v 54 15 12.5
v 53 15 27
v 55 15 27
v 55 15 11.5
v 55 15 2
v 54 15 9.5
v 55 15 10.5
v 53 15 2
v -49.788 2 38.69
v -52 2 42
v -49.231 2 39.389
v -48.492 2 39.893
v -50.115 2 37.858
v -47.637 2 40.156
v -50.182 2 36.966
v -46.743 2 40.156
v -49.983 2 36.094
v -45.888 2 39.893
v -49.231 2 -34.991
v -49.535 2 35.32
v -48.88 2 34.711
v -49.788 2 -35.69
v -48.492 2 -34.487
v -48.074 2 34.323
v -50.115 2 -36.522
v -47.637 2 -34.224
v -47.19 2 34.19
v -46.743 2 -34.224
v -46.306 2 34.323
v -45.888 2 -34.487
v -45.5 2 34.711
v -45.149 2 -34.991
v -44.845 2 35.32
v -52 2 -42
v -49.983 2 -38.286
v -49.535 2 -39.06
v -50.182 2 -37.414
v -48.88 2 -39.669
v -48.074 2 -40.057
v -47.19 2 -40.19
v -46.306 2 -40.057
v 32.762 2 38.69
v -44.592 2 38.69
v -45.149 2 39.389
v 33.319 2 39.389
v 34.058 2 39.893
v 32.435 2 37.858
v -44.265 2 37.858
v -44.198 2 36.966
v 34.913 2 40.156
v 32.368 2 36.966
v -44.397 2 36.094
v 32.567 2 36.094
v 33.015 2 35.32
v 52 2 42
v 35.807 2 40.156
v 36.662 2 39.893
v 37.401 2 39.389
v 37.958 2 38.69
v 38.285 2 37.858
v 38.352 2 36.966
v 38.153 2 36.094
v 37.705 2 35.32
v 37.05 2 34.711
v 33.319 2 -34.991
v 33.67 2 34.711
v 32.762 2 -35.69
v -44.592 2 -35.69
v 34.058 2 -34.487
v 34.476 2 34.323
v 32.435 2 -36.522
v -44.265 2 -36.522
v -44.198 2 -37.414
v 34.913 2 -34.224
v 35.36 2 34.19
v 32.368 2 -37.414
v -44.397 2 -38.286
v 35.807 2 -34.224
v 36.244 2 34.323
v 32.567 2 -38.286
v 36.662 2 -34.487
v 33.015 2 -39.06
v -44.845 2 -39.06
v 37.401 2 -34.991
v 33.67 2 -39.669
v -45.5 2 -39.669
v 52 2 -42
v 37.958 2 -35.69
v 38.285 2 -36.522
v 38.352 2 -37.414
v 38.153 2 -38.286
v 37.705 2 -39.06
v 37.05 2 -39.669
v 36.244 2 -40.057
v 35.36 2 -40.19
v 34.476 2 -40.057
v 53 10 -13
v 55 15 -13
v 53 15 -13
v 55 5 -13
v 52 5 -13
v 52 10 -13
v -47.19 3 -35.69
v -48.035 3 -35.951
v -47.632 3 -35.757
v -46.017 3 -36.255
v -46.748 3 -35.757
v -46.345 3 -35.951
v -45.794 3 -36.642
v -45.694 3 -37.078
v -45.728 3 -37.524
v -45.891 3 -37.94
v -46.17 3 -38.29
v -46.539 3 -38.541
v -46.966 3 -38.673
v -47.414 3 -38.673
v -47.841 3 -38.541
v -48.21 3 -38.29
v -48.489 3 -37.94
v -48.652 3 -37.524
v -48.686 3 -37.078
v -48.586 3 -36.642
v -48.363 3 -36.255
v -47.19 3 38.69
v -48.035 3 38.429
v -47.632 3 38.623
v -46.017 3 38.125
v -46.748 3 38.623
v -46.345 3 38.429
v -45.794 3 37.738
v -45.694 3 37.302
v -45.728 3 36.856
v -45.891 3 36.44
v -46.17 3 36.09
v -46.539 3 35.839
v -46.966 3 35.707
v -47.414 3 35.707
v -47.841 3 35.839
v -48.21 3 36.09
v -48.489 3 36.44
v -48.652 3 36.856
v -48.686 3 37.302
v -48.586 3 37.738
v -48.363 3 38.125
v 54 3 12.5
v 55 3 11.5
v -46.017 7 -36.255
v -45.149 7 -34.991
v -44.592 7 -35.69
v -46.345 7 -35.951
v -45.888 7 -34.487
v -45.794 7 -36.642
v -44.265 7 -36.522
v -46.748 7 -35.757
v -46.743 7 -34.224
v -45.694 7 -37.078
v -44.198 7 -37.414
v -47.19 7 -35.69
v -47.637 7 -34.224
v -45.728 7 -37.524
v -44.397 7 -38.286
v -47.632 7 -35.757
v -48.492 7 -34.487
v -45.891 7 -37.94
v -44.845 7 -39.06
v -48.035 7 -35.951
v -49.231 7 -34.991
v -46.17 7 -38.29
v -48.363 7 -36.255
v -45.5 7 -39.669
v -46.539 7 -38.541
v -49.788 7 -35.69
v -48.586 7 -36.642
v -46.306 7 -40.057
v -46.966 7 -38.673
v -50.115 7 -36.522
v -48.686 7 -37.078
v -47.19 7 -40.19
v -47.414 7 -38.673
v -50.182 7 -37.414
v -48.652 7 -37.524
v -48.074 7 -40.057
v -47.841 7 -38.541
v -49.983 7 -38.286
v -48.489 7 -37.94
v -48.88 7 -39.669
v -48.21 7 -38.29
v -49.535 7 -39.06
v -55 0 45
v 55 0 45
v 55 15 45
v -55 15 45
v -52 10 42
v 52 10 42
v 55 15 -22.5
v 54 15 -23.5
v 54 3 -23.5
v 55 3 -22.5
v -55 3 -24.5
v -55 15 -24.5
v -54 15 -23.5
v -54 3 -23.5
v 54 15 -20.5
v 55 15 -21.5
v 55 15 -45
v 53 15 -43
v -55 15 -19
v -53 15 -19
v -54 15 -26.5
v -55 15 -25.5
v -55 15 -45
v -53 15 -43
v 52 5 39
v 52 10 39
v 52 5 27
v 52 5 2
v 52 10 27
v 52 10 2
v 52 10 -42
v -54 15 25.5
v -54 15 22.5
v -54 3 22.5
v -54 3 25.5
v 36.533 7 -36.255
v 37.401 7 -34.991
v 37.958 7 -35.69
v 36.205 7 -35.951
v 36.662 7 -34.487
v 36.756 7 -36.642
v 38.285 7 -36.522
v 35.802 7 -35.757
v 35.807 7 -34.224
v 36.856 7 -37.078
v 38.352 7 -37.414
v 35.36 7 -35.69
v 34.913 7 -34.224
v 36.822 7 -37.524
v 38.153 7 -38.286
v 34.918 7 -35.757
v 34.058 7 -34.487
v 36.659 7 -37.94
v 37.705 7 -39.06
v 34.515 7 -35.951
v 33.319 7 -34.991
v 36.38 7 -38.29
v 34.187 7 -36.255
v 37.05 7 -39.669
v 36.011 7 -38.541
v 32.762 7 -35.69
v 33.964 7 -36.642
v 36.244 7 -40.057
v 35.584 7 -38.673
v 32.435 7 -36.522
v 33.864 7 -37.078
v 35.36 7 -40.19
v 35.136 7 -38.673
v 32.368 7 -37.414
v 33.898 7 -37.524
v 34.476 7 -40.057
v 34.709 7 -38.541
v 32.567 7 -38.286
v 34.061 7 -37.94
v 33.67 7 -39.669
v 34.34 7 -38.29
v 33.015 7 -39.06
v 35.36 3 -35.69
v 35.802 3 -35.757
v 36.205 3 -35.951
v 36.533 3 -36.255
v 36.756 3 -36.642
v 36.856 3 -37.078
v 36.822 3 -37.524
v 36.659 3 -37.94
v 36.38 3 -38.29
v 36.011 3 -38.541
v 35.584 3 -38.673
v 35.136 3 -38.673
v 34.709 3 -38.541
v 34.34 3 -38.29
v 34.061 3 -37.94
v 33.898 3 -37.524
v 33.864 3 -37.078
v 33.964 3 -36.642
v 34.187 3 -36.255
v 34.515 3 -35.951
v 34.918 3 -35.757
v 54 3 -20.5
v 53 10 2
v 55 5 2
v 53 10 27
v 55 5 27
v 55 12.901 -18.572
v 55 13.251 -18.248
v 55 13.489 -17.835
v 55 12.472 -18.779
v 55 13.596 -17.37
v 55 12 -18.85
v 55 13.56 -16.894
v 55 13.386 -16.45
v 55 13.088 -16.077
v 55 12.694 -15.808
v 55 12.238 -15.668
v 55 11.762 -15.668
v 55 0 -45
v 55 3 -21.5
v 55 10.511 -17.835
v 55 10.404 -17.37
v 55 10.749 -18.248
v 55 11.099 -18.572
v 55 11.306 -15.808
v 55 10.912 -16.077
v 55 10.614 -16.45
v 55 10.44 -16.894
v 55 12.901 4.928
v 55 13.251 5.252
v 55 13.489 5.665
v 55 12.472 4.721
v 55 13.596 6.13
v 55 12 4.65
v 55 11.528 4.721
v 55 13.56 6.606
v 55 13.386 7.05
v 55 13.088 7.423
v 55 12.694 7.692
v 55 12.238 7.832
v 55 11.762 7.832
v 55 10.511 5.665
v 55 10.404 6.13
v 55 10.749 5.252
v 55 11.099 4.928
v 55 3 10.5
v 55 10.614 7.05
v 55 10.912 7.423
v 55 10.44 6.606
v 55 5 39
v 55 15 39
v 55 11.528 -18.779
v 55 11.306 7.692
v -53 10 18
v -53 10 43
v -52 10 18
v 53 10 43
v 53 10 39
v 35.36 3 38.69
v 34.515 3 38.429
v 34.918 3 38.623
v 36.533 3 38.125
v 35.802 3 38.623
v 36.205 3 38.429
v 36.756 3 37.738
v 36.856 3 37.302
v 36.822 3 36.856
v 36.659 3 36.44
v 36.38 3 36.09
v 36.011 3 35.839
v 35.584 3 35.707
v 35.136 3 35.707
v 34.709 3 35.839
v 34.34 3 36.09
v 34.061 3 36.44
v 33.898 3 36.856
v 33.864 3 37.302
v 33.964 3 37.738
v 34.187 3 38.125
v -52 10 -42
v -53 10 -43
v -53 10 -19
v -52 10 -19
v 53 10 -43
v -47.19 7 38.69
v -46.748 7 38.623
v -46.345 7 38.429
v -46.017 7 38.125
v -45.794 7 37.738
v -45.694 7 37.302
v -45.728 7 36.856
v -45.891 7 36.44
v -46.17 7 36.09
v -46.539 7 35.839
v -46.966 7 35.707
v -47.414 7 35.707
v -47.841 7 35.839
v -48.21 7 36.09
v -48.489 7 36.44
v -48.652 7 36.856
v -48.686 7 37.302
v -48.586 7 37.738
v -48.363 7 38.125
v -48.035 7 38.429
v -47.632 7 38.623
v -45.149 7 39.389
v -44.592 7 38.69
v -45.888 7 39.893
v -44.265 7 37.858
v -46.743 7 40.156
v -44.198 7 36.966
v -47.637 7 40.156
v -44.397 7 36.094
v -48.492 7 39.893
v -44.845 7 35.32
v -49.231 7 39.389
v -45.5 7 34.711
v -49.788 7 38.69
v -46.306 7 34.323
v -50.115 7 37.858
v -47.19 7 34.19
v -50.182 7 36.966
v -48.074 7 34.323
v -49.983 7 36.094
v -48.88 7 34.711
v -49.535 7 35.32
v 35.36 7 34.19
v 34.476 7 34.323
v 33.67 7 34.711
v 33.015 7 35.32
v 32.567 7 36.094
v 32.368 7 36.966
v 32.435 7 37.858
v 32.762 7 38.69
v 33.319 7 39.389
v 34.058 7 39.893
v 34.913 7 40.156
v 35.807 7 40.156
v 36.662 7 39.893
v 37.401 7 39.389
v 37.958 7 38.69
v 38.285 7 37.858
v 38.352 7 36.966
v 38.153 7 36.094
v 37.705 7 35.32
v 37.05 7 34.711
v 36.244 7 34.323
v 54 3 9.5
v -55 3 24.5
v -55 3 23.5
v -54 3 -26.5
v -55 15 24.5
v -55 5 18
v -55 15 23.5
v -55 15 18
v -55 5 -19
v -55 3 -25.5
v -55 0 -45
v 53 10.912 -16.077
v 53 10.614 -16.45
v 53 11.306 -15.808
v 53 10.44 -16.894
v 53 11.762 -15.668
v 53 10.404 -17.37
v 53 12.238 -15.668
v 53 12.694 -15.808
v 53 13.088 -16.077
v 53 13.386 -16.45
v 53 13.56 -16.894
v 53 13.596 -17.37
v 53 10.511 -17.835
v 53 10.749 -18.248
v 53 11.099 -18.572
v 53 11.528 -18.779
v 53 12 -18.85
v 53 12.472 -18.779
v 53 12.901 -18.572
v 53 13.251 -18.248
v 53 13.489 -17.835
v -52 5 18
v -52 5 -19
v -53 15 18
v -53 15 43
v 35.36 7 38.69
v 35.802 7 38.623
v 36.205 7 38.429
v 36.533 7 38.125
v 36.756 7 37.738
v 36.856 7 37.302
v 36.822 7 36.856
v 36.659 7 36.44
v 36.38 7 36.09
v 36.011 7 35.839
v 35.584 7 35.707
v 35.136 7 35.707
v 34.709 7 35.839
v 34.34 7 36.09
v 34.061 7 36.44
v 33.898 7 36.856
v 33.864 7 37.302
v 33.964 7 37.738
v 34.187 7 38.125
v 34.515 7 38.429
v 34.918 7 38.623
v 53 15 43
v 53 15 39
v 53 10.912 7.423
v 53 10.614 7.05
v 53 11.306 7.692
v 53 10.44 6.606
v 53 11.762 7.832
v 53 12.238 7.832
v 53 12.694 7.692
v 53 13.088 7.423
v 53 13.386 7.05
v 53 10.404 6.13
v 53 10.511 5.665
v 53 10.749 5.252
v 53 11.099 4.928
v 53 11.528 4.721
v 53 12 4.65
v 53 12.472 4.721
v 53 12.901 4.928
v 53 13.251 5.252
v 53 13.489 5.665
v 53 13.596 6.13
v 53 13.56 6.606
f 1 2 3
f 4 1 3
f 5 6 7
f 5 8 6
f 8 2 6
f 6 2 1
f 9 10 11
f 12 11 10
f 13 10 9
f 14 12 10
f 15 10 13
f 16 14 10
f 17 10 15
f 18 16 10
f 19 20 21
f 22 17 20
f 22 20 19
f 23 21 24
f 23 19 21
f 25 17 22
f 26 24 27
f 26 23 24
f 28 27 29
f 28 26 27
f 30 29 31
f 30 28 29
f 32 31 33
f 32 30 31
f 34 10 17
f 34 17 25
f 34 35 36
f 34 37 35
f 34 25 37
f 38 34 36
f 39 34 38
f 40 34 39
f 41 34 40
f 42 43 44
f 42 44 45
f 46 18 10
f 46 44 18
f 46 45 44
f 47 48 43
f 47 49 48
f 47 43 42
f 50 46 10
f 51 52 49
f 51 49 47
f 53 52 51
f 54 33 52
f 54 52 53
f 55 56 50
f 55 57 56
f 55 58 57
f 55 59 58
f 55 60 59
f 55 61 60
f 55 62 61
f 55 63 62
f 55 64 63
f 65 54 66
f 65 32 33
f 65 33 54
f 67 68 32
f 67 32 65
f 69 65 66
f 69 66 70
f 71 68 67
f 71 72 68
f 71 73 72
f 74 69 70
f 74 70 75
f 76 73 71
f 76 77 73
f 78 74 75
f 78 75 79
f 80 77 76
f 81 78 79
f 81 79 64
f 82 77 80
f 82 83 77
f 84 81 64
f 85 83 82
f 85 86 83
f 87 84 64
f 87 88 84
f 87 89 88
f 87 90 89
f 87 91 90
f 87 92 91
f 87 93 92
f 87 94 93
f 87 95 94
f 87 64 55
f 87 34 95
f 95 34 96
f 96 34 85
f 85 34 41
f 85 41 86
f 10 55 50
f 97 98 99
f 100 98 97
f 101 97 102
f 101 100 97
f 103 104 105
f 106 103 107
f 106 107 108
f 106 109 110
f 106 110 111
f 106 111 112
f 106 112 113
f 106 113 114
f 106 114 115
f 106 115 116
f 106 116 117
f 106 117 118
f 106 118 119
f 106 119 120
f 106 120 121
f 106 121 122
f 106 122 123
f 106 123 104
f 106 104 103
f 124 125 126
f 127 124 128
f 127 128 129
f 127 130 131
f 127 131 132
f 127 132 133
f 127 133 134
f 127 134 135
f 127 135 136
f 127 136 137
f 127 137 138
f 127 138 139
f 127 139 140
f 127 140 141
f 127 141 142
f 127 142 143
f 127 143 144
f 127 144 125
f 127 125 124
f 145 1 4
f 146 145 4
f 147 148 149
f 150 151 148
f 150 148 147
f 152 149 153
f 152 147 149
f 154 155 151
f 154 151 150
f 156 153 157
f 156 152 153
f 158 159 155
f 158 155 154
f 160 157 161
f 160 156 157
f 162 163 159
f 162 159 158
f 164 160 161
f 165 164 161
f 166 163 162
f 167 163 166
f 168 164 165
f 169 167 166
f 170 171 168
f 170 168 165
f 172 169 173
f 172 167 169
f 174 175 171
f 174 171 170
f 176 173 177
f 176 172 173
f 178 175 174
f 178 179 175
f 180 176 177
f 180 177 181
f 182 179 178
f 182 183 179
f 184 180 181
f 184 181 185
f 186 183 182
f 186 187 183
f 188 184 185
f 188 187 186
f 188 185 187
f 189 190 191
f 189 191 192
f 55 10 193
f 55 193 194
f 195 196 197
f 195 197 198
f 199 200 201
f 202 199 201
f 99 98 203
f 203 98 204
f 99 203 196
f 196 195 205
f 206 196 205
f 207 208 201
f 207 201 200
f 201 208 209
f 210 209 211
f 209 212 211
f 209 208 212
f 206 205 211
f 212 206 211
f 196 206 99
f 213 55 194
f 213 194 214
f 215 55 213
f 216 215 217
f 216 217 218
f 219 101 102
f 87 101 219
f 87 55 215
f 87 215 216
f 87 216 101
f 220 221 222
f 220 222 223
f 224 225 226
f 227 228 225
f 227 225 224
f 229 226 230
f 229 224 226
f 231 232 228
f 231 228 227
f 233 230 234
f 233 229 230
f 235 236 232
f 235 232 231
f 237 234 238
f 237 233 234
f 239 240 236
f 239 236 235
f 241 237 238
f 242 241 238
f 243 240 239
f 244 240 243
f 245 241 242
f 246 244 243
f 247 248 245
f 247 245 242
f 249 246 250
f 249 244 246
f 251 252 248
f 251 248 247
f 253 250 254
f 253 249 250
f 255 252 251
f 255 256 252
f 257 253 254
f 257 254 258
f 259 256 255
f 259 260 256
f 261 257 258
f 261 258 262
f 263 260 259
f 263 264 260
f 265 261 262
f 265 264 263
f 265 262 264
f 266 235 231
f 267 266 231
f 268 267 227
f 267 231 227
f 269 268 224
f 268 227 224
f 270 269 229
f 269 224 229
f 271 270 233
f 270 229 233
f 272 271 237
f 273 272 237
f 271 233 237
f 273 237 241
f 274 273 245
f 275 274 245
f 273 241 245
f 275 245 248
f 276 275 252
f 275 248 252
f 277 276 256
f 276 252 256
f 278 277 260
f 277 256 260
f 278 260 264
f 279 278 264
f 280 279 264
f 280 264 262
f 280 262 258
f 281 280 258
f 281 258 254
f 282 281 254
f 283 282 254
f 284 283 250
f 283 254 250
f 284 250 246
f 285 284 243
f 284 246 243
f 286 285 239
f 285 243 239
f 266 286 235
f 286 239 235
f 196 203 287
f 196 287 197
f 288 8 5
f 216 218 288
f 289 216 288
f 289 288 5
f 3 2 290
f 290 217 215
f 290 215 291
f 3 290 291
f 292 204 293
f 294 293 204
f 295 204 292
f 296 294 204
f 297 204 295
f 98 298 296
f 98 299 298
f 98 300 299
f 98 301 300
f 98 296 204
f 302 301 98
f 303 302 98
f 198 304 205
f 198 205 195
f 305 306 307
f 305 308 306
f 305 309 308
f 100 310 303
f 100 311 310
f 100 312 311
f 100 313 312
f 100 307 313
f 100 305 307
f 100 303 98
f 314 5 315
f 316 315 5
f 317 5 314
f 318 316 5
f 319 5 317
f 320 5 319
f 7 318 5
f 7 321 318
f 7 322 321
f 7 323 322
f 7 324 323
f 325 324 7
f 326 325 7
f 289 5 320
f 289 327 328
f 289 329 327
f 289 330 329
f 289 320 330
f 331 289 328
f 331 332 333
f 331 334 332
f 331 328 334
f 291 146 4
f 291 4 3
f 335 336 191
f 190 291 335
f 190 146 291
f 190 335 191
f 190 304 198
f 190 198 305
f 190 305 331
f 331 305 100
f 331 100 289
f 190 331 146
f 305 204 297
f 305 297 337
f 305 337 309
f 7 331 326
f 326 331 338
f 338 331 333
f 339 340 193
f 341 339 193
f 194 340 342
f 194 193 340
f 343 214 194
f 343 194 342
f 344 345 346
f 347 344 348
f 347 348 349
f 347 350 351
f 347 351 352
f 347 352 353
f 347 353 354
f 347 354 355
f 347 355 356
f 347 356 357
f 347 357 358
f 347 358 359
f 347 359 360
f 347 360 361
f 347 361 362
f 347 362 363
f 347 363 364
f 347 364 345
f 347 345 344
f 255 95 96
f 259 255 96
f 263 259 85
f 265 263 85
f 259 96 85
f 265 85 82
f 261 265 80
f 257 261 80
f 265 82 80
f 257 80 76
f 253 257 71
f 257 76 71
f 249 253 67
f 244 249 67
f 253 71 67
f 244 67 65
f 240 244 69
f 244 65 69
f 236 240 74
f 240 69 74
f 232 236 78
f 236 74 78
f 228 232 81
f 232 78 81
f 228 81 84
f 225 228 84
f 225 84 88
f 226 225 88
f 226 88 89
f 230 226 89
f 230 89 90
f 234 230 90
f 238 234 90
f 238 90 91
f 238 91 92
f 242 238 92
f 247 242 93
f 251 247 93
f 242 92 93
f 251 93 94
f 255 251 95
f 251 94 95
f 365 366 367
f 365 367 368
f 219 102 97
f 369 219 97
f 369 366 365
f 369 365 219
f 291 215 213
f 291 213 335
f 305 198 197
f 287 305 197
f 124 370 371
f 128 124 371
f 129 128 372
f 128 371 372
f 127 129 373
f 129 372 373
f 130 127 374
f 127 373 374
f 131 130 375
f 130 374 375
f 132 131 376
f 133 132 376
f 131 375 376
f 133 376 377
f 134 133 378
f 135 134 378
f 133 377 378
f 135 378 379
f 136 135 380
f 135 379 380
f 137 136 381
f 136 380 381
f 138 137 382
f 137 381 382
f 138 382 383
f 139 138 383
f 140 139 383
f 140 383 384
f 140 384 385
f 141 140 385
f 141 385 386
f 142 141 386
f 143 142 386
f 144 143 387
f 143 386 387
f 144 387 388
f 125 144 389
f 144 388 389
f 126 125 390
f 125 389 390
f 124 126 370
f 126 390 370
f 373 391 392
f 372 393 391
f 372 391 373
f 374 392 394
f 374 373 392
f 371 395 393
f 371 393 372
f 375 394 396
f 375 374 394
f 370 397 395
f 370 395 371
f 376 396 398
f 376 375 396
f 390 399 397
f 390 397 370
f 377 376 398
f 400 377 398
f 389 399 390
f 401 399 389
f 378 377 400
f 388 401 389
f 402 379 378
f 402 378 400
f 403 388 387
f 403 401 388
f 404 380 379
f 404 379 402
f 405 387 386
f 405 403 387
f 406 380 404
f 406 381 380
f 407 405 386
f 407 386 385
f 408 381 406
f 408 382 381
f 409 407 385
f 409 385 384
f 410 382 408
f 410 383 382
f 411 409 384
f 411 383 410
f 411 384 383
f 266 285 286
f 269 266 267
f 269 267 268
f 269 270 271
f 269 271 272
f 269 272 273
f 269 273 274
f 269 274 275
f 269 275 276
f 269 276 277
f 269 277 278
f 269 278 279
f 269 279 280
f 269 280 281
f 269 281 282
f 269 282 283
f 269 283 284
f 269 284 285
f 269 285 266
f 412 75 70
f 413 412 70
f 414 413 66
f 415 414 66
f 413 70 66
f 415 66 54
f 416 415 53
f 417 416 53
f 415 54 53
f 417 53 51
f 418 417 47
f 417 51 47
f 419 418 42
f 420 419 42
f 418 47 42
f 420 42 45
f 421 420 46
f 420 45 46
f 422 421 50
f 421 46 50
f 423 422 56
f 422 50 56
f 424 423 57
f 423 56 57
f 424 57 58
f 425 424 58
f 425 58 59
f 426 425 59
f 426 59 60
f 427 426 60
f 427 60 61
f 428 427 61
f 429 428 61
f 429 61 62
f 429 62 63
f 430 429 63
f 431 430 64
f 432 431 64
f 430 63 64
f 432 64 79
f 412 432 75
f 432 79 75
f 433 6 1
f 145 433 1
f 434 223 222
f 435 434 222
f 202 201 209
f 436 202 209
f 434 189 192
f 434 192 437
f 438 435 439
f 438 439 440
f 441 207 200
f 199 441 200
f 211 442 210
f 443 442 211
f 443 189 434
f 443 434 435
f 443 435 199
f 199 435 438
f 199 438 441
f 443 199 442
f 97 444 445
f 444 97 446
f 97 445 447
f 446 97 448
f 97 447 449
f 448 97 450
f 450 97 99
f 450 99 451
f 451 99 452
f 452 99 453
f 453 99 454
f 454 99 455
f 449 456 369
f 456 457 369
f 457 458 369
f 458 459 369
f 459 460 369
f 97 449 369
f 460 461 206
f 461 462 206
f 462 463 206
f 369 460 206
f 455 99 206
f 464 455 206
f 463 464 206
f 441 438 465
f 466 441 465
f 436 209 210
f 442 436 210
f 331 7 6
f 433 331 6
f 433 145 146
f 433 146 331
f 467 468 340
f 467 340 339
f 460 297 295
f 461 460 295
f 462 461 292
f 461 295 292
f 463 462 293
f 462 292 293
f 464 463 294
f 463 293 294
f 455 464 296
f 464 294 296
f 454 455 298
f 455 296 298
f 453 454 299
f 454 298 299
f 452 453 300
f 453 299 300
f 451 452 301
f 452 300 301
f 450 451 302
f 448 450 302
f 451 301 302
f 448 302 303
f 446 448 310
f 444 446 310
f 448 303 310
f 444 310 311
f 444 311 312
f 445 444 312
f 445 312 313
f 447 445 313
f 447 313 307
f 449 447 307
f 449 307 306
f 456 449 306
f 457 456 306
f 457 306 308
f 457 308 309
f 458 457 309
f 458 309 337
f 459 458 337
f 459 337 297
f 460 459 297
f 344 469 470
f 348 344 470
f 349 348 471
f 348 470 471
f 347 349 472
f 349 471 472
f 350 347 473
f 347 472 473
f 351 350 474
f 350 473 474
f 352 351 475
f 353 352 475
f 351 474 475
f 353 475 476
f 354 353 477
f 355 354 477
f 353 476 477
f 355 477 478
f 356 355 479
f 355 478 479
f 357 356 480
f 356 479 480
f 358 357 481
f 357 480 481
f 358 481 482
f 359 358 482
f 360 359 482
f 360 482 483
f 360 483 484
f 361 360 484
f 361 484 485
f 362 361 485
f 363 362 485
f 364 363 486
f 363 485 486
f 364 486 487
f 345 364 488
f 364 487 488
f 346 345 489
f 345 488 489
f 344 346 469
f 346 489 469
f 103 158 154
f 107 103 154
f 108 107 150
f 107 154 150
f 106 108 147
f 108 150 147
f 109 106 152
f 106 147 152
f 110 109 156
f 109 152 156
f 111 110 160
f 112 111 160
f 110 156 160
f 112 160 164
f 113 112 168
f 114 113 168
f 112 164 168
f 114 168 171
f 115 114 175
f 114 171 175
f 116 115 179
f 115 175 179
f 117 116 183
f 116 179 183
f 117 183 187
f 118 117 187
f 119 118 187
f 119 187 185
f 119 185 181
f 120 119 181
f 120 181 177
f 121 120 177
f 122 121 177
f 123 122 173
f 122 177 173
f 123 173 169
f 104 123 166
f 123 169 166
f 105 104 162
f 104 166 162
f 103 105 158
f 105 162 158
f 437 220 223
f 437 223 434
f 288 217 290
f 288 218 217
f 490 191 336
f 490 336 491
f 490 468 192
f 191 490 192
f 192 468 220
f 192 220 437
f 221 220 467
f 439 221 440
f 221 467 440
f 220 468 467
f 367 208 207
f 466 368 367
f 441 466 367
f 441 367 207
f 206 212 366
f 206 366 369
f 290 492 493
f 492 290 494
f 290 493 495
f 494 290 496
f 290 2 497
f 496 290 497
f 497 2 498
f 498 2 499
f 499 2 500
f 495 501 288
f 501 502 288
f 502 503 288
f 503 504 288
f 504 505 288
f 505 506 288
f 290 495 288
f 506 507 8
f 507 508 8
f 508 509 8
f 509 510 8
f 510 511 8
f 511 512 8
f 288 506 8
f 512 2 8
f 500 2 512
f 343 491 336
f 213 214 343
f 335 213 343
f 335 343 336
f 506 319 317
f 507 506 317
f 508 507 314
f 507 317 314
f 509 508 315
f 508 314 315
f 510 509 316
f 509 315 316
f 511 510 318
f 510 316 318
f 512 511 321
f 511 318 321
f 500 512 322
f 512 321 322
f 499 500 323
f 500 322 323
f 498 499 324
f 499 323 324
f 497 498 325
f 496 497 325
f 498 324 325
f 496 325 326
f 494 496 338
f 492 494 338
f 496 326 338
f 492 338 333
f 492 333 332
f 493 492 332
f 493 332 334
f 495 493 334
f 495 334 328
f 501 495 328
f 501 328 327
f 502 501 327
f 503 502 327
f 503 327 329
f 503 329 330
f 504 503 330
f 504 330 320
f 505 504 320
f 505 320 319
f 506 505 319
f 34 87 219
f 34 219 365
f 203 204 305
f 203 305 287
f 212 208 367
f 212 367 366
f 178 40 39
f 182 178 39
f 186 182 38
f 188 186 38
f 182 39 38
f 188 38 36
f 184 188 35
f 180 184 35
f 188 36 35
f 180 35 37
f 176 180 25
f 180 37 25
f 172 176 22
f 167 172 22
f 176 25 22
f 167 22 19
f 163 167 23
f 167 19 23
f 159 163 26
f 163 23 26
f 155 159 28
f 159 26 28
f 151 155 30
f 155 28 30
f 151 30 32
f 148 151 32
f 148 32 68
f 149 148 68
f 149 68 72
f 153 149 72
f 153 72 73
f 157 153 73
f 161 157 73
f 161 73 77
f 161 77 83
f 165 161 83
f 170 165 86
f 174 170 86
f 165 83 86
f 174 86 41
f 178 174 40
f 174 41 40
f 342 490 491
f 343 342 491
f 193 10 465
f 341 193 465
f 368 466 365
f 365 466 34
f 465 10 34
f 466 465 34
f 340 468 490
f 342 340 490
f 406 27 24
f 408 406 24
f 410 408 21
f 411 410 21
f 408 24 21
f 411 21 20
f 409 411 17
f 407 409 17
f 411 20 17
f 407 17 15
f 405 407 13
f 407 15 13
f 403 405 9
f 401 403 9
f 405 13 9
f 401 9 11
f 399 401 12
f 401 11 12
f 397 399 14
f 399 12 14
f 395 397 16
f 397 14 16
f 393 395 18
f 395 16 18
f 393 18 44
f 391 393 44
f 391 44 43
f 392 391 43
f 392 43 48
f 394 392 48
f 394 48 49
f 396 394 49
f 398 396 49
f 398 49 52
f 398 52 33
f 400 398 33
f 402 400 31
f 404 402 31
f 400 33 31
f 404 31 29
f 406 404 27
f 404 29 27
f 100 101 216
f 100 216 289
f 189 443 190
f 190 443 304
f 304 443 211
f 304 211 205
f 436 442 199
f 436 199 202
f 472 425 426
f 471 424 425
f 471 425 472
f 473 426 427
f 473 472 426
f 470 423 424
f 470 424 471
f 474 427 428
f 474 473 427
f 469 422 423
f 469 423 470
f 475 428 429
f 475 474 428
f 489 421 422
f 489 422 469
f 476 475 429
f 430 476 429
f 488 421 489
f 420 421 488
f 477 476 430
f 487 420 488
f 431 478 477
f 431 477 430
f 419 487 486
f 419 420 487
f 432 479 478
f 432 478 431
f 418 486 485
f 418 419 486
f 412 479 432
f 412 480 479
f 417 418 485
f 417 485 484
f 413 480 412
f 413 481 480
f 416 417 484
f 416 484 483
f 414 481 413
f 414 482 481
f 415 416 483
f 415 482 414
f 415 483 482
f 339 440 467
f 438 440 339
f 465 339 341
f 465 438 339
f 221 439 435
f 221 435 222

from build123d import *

# Parameters (mm, degrees)
CROQUIS1_W              = 110
CROQUIS1_H              = 90
SALIENTE_EXTRUIR1_DEPTH = 2
CROQUIS3_R              = 3
SALIENTE_EXTRUIR2_DEPTH = 5
CROQUIS4_R              = 1.5
CORTAR_EXTRUIR1_DEPTH   = 4
CROQUIS5_W              = 3
CROQUIS5_H              = 25
SALIENTE_EXTRUIR3_DEPTH = 13
CROQUIS6_W              = 3
CROQUIS6_H              = 37
CROQUIS6_H_2            = 15
CROQUIS6_H_3            = 12
SALIENTE_EXTRUIR4_DEPTH = 3
CROQUIS7_W              = 106
CROQUIS7_H              = 86
CROQUIS7_W_2            = 104
CROQUIS7_H_2            = 84
CORTAR_EXTRUIR2_DEPTH   = 5
CORTAR_EXTRUIR3_DEPTH   = 12
CROQUIS9_R              = 1.6
CORTAR_EXTRUIR4_DEPTH   = 12
CORTAR_EXTRUIR5_DEPTH   = 12


with BuildPart() as part:
    # Croquis1 → Saliente-Extruir1 (new body)
    with BuildSketch(Plane(origin=(0, 0, 0), x_dir=(1, 0, 0), z_dir=(0, 1, 0))):
        Rectangle(CROQUIS1_W, CROQUIS1_H)
    extrude(amount=SALIENTE_EXTRUIR1_DEPTH)

    # Croquis3 → Saliente-Extruir2 (add)
    with BuildSketch(Plane(origin=(0, 2, 0), x_dir=(1, 0, 0), z_dir=(0, 1, 0))):
        with Locations(Location((-47.19, -37.19, 0), (0, 0, 90))):
            Circle(CROQUIS3_R)
        with Locations(Location((-47.19, 37.19, 0), (0, 0, 90))):
            Circle(CROQUIS3_R)
        with Locations(Location((35.36, -37.19, 0), (0, 0, 90))):
            Circle(CROQUIS3_R)
        with Locations(Location((35.36, 37.19, 0), (0, 0, 90))):
            Circle(CROQUIS3_R)
    extrude(amount=SALIENTE_EXTRUIR2_DEPTH)

    # Croquis4 → Cortar-Extruir1 (cut)
    with BuildSketch(Plane(origin=(0, 7, 0), x_dir=(1, 0, 0), z_dir=(0, 1, 0))):
        with Locations(Location((-47.19, -37.19, 0), (0, 0, 270))):
            Circle(CROQUIS4_R)
        with Locations(Location((35.36, -37.19, 0), (0, 0, 270))):
            Circle(CROQUIS4_R)
        with Locations(Location((35.36, 37.19, 0), (0, 0, 270))):
            Circle(CROQUIS4_R)
        with Locations(Location((-47.19, 37.19, 0), (0, 0, 270))):
            Circle(CROQUIS4_R)
    extrude(amount=-CORTAR_EXTRUIR1_DEPTH, mode=Mode.SUBTRACT)

    # Croquis5 → Saliente-Extruir3 (add)
    with BuildSketch(Plane(origin=(0, 2, 0), x_dir=(1, 0, 0), z_dir=(0, 1, 0))):
        Polygon((52, -39), (55, -39), (55, -45), (-55, -45), (-55, -18), (-52, -18), (-52, -42), (52, -42), align=None)
        Polygon((-55, 45), (55, 45), (55, 13), (52, 13), (52, 42), (-52, 42), (-52, 19), (-55, 19), align=None)
        with Locations((53.5, -14.5)):
            Rectangle(CROQUIS5_W, CROQUIS5_H)
    extrude(amount=SALIENTE_EXTRUIR3_DEPTH)

    # Croquis6 → Saliente-Extruir4 (add)
    with BuildSketch(Plane(origin=(0, 2, 0), x_dir=(1, 0, 0), z_dir=(0, 1, 0))):
        with Locations((-53.5, 0.5)):
            Rectangle(CROQUIS6_W, CROQUIS6_H)
        with Locations((53.5, 5.5)):
            Rectangle(CROQUIS6_W, CROQUIS6_H_2)
        with Locations((53.5, -33)):
            Rectangle(CROQUIS6_W, CROQUIS6_H_3)
    extrude(amount=SALIENTE_EXTRUIR4_DEPTH)

    # Croquis7 → Cortar-Extruir2 (cut)
    with BuildSketch(Plane(origin=(0, 15, 0), x_dir=(1, 0, 0), z_dir=(0, 1, 0))):
        Rectangle(CROQUIS7_W, CROQUIS7_H)
        Rectangle(CROQUIS7_W_2, CROQUIS7_H_2, mode=Mode.SUBTRACT)
    extrude(amount=-CORTAR_EXTRUIR2_DEPTH, mode=Mode.SUBTRACT)

    # Croquis8 → Cortar-Extruir3 (cut)
    with BuildSketch(Plane(origin=(0, 15, 0), x_dir=(1, 0, 0), z_dir=(0, 1, 0))):
        Polygon((55, -10.5), (54, -9.5), (54, -12.5), (55, -11.5), align=None)
        Polygon((55, 22.5), (55, 21.5), (54, 20.5), (54, 23.5), align=None)
    extrude(amount=-CORTAR_EXTRUIR3_DEPTH, mode=Mode.SUBTRACT)

    # Croquis9 → Cortar-Extruir4 (cut)
    with BuildSketch(Plane(origin=(55, 0, 0), x_dir=(0, 0, -1), z_dir=(1, 0, 0))):
        with Locations((-6.25, 12)):
            Circle(CROQUIS9_R)
        with Locations((17.25, 12)):
            Circle(CROQUIS9_R)
    extrude(amount=-CORTAR_EXTRUIR4_DEPTH, mode=Mode.SUBTRACT)

    # Croquis11 → Cortar-Extruir5 (cut)
    with BuildSketch(Plane(origin=(0, 15, 0), x_dir=(1, 0, 0), z_dir=(0, 1, 0))):
        Polygon((-55, -23.5), (-54, -22.5), (-54, -25.5), (-55, -24.5), align=None)
        Polygon((-55, 25.5), (-55, 24.5), (-54, 23.5), (-54, 26.5), align=None)
    extrude(amount=-CORTAR_EXTRUIR5_DEPTH, mode=Mode.SUBTRACT)


solid = part.part
